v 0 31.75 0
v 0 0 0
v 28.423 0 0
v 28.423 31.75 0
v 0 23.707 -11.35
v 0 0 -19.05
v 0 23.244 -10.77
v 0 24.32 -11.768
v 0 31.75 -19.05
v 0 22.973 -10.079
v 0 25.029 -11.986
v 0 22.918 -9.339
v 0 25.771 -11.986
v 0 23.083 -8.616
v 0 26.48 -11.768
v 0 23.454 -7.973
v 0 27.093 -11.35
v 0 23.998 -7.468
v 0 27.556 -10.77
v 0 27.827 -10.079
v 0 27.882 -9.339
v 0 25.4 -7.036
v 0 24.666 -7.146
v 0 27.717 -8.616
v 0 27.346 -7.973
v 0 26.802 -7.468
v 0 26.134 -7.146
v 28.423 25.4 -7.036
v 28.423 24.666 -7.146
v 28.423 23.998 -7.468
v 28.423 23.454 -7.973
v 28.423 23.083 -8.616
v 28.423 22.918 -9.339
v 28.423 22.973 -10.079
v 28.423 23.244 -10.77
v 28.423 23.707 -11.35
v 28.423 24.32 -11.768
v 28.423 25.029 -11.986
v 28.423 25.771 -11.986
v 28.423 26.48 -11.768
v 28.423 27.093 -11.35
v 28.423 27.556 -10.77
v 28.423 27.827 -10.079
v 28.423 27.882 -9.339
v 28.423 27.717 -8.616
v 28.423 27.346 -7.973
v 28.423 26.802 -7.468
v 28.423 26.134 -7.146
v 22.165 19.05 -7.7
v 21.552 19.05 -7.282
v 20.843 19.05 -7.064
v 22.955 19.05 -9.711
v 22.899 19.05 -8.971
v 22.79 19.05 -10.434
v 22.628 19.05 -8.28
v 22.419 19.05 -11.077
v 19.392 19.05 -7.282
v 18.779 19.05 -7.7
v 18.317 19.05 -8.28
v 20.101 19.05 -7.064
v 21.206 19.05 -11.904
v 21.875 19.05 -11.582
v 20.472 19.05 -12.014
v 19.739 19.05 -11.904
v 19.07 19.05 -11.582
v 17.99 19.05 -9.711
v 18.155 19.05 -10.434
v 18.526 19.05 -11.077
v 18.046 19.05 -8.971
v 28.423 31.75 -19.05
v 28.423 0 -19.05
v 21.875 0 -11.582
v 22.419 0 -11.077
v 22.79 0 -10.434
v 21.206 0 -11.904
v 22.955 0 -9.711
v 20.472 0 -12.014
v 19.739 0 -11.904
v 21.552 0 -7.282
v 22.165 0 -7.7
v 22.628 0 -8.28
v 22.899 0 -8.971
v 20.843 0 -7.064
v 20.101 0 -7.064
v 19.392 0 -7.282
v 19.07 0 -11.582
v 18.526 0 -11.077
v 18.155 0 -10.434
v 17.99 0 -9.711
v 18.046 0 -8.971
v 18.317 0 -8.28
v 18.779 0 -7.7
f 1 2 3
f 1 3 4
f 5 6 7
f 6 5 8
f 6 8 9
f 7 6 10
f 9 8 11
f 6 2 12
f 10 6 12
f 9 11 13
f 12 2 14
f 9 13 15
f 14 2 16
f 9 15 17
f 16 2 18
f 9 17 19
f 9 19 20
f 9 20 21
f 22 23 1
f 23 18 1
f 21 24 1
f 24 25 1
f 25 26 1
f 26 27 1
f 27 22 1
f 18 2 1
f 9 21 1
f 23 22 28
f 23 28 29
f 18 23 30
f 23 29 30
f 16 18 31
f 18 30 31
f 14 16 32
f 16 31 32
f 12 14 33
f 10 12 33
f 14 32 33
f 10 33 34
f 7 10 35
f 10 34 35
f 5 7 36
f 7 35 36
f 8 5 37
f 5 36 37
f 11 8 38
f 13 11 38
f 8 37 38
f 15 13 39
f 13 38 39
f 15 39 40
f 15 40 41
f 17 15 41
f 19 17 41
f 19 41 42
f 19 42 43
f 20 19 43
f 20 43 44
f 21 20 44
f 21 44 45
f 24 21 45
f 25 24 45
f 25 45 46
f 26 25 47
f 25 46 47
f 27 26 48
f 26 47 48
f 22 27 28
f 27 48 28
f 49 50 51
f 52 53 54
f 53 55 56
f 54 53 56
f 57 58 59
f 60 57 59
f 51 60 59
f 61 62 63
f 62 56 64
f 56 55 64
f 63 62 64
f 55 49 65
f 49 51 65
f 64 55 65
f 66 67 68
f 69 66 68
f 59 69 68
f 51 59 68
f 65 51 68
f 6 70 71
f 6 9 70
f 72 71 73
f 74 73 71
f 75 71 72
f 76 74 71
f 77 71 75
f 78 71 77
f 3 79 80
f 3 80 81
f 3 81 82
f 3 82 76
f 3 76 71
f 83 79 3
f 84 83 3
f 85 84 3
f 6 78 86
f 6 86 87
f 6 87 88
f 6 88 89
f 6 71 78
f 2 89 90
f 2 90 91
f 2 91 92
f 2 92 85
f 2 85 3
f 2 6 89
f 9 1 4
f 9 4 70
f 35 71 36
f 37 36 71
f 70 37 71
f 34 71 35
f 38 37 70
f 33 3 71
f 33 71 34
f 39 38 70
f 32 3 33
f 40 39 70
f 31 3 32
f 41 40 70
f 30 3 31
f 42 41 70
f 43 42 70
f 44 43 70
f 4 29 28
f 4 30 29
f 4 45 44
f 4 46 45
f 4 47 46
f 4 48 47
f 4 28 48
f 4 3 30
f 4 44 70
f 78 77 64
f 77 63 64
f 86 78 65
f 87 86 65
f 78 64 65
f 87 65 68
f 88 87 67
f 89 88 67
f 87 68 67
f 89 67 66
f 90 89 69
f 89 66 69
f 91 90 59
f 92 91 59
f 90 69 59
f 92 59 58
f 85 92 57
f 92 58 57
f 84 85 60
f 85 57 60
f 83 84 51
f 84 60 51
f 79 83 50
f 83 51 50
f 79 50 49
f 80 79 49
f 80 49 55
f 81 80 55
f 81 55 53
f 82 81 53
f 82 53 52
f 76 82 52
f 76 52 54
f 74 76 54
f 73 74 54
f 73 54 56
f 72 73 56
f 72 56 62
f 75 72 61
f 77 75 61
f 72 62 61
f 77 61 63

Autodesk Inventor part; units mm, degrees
ref_plane "YZ Plane" through (0, 0, 0) normal (1, 0, 0) x (0, 1, 0)
ref_plane "XZ Plane" through (0, 0, 0) normal (0, 1, 0) x (-1, 0, 0)
ref_plane "XY Plane" through (0, 0, 0) normal (0, 0, 1) x (1, 0, 0)
sketch "Sketch1" plane through (0, 0, 0) normal (1, 0, 0) x (0, 1, 0)
  line L0 (0, 0) -> (31.75, 0)
  line L1 (31.75, 0) -> (31.75, -19.05)
  line L2 (31.75, -19.05) -> (0, -19.05)
  line L3 (0, -19.05) -> (0, 0)
  circle A0 centre (25.4, -9.525) radius 3.2512 construction
  dimension "d0" = 31.75
  dimension "d1" = 19.05
  dimension "d2" = 6.5024
  dimension "d3" = 6.35
  dimension "d4" = 9.525
extrude "Extrusion1" add sketch "Sketch1" along normal blind 28.4226
hole "Hole1" at (0, 25.4, -9.525) at (0, 25.4, -9.525) direction (1, 0, 0) diameter 4.9784 end through all thread size "1/4-20 UNC" class "2B" standard "ANSI Unified Screw Threads"
sketch "Sketch2" plane through (0, 0, -19.05) normal (0, -1, 0) x (1, 0, 0)
  line L0 (0, 19.05) -> (0, 0) projected
  line L1 (0, 0) -> (28.4226, 0) projected
  line L2 (28.4226, 19.05) -> (28.4226, 0) projected
  line L3 (0, 19.05) -> (28.4226, 19.05) projected
  line L4 (28.4226, 2.307) -> (7.7724, 2.307) construction
  point P0 (20.4724, 9.525)
  dimension "d14" = 20.6502
  dimension "d15" = 7.9502
  dimension "d16" = 9.525
hole "Hole2" at (20.4724, 0, -9.525) direction (0, 1, 0) diameter 4.9784 depth 19.05 thread size "1/4-20 UNC" class "2B" standard "ANSI Unified Screw Threads"
properties part number "Intake Pivot Billet" material "Aluminum 6061"
